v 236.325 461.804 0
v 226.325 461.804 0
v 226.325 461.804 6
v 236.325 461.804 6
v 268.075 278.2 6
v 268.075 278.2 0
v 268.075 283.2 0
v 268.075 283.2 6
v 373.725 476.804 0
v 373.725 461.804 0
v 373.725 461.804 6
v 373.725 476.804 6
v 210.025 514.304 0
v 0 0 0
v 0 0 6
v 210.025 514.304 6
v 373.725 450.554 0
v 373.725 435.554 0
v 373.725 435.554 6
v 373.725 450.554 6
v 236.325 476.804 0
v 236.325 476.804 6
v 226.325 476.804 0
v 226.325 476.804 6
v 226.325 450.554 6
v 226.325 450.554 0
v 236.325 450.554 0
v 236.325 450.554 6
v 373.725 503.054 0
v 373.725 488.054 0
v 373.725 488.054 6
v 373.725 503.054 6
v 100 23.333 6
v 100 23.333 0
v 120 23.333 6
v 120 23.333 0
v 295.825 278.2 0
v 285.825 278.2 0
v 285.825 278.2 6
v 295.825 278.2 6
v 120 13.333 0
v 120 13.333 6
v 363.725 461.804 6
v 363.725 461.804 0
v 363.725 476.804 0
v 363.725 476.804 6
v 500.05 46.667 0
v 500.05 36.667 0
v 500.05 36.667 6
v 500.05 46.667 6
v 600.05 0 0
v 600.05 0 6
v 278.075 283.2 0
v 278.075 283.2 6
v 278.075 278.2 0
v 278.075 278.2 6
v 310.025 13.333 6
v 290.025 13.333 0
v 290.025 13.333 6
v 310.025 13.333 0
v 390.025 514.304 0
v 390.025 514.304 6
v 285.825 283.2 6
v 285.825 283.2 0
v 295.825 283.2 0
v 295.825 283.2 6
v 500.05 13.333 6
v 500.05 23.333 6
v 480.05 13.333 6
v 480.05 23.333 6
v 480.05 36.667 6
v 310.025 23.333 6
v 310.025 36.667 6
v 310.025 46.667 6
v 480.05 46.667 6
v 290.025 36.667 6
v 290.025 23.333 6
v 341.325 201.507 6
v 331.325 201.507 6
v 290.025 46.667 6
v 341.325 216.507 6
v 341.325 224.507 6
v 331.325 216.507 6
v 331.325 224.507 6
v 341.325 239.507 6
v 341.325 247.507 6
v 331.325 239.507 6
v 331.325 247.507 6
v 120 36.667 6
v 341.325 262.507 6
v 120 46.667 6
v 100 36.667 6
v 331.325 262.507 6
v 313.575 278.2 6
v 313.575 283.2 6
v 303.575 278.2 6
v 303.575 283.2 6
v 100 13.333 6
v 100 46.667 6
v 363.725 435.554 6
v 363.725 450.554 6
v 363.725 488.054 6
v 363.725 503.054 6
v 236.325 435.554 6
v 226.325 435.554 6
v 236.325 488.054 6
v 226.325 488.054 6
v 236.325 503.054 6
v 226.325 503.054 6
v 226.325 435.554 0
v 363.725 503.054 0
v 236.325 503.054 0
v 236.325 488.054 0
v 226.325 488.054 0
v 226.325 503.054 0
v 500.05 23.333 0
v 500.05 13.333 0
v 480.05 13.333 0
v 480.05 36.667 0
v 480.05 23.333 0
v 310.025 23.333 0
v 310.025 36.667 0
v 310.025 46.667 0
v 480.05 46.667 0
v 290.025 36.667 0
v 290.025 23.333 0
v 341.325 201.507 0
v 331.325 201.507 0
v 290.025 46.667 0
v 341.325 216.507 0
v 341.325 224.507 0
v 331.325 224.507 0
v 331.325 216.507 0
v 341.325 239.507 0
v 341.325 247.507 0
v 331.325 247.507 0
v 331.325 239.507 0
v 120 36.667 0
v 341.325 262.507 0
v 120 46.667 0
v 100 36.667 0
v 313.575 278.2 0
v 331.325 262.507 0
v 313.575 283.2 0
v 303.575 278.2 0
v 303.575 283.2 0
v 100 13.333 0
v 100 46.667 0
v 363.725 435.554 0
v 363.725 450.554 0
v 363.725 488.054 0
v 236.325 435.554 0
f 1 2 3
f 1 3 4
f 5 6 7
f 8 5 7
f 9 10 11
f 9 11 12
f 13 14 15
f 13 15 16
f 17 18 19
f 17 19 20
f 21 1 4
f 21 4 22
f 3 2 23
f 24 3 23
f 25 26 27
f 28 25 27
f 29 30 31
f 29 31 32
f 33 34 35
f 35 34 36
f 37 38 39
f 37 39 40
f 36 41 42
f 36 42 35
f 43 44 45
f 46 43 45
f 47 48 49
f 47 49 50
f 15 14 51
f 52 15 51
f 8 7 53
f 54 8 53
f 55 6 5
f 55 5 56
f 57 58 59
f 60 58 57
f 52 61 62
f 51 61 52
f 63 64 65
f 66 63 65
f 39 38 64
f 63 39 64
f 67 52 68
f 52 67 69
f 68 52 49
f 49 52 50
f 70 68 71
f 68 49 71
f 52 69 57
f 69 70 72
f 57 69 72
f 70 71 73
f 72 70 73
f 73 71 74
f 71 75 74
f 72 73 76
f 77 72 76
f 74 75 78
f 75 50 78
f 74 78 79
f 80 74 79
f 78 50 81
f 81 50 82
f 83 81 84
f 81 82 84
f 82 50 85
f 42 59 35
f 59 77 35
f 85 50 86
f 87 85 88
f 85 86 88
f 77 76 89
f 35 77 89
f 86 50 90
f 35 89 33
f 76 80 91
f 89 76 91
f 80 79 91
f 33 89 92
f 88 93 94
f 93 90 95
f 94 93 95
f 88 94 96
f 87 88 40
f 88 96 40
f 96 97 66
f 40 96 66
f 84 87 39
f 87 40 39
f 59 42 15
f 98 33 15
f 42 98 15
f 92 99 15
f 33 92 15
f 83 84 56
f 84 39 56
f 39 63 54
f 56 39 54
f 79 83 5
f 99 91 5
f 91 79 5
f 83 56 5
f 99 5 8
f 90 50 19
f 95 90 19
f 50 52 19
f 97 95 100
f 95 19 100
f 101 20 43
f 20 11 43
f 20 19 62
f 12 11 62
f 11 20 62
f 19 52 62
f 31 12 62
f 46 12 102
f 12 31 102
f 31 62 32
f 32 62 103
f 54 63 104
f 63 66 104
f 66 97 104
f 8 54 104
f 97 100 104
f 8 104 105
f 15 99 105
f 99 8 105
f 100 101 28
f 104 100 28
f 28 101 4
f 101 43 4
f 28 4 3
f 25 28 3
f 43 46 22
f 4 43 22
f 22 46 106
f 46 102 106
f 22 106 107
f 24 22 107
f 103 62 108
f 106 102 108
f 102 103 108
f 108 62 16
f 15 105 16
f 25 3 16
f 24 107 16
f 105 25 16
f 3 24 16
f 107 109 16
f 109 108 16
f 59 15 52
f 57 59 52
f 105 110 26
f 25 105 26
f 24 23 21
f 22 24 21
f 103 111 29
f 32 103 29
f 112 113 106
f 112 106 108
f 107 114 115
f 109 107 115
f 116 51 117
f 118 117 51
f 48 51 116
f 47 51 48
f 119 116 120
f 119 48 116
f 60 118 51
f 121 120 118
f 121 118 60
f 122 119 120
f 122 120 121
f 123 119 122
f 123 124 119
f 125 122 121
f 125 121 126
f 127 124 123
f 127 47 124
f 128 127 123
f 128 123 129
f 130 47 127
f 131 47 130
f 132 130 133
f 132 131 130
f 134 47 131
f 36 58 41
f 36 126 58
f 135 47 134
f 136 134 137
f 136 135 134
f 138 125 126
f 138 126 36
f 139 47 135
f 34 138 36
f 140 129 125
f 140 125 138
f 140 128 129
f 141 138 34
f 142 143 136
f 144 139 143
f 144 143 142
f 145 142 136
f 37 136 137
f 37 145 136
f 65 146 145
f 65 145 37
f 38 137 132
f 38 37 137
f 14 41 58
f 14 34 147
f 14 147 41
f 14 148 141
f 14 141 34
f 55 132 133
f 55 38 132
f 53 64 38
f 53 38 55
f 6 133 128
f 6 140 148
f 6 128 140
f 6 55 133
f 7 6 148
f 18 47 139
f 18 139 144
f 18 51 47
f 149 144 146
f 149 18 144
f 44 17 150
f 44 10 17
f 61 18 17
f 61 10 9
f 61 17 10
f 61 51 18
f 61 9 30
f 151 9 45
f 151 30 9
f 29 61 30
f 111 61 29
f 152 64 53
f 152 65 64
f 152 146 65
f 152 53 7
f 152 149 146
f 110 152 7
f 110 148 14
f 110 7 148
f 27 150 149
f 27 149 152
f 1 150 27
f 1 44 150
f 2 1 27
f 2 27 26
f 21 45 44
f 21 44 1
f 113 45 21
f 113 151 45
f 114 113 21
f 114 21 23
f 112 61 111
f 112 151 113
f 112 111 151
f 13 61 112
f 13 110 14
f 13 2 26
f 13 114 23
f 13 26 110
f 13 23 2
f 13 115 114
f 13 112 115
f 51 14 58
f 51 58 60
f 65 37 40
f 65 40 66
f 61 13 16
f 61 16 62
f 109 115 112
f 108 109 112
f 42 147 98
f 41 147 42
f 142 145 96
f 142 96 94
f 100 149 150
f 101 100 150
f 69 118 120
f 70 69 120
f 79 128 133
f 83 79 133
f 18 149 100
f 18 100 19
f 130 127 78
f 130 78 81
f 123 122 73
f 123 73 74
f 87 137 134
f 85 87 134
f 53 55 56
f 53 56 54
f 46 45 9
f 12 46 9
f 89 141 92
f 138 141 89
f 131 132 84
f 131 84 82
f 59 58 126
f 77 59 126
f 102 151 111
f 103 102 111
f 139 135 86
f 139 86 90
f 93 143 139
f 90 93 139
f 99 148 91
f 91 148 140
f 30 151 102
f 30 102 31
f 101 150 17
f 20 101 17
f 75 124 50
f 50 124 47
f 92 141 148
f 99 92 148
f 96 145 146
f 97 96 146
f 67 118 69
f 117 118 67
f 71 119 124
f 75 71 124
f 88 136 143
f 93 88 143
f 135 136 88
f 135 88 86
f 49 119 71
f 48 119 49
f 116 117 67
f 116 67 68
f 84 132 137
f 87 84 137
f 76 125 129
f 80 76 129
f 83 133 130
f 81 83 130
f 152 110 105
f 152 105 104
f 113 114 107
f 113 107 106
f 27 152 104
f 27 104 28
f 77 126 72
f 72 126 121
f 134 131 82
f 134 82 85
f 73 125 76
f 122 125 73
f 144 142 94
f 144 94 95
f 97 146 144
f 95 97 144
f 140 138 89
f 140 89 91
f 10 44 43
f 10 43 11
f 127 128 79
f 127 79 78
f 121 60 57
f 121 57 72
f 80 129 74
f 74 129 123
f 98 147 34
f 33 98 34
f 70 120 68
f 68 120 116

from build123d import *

# Parameters (mm, degrees)
SKETCH1_W           = 20
SKETCH1_H           = 10
SKETCH1_W_2         = 10
SKETCH1_H_2         = 5
SKETCH1_H_3         = 15
BOSS_EXTRUDE1_DEPTH = 6


with BuildPart() as part:
    # Sketch1 → Boss-Extrude1 (new body)
    with BuildSketch(Plane.XY):
        Polygon((296.475, 0), (0, 0), (210.025, 514.3036198), (390.025, 514.3036198), (600.05, 0), (300.025, 0), align=None)
        with Locations((110, 18.333333333)):
            Rectangle(SKETCH1_W, SKETCH1_H, mode=Mode.SUBTRACT)
        with Locations((110, 41.666666667)):
            Rectangle(SKETCH1_W, SKETCH1_H, mode=Mode.SUBTRACT)
        with Locations((490.05, 41.666666667)):
            Rectangle(SKETCH1_W, SKETCH1_H, mode=Mode.SUBTRACT)
        with Locations((490.05, 18.333333333)):
            Rectangle(SKETCH1_W, SKETCH1_H, mode=Mode.SUBTRACT)
        with Locations((308.575, 280.6998099)):
            Rectangle(SKETCH1_W_2, SKETCH1_H_2, mode=Mode.SUBTRACT)
        with Locations((290.825, 280.6998099)):
            Rectangle(SKETCH1_W_2, SKETCH1_H_2, mode=Mode.SUBTRACT)
        with Locations((273.075, 280.6998099)):
            Rectangle(SKETCH1_W_2, SKETCH1_H_2, mode=Mode.SUBTRACT)
        with Locations((368.725, 495.5536198)):
            Rectangle(SKETCH1_W_2, SKETCH1_H_3, mode=Mode.SUBTRACT)
        with Locations((368.725, 469.3036198)):
            Rectangle(SKETCH1_W_2, SKETCH1_H_3, mode=Mode.SUBTRACT)
        with Locations((336.325, 255.0068099)):
            Rectangle(SKETCH1_W_2, SKETCH1_H_3, mode=Mode.SUBTRACT)
        with Locations((336.325, 232.0068099)):
            Rectangle(SKETCH1_W_2, SKETCH1_H_3, mode=Mode.SUBTRACT)
        with Locations((336.325, 209.0068099)):
            Rectangle(SKETCH1_W_2, SKETCH1_H_3, mode=Mode.SUBTRACT)
        with Locations((368.725, 443.0536198)):
            Rectangle(SKETCH1_W_2, SKETCH1_H_3, mode=Mode.SUBTRACT)
        with Locations((231.325, 443.0536198)):
            Rectangle(SKETCH1_W_2, SKETCH1_H_3, mode=Mode.SUBTRACT)
        with Locations((231.325, 469.3036198)):
            Rectangle(SKETCH1_W_2, SKETCH1_H_3, mode=Mode.SUBTRACT)
        with Locations((231.325, 495.5536198)):
            Rectangle(SKETCH1_W_2, SKETCH1_H_3, mode=Mode.SUBTRACT)
        with Locations((300.025, 41.666666667)):
            Rectangle(SKETCH1_W, SKETCH1_H, mode=Mode.SUBTRACT)
        with Locations((300.025, 18.333333333)):
            Rectangle(SKETCH1_W, SKETCH1_H, mode=Mode.SUBTRACT)
    extrude(amount=BOSS_EXTRUDE1_DEPTH)


solid = part.part
